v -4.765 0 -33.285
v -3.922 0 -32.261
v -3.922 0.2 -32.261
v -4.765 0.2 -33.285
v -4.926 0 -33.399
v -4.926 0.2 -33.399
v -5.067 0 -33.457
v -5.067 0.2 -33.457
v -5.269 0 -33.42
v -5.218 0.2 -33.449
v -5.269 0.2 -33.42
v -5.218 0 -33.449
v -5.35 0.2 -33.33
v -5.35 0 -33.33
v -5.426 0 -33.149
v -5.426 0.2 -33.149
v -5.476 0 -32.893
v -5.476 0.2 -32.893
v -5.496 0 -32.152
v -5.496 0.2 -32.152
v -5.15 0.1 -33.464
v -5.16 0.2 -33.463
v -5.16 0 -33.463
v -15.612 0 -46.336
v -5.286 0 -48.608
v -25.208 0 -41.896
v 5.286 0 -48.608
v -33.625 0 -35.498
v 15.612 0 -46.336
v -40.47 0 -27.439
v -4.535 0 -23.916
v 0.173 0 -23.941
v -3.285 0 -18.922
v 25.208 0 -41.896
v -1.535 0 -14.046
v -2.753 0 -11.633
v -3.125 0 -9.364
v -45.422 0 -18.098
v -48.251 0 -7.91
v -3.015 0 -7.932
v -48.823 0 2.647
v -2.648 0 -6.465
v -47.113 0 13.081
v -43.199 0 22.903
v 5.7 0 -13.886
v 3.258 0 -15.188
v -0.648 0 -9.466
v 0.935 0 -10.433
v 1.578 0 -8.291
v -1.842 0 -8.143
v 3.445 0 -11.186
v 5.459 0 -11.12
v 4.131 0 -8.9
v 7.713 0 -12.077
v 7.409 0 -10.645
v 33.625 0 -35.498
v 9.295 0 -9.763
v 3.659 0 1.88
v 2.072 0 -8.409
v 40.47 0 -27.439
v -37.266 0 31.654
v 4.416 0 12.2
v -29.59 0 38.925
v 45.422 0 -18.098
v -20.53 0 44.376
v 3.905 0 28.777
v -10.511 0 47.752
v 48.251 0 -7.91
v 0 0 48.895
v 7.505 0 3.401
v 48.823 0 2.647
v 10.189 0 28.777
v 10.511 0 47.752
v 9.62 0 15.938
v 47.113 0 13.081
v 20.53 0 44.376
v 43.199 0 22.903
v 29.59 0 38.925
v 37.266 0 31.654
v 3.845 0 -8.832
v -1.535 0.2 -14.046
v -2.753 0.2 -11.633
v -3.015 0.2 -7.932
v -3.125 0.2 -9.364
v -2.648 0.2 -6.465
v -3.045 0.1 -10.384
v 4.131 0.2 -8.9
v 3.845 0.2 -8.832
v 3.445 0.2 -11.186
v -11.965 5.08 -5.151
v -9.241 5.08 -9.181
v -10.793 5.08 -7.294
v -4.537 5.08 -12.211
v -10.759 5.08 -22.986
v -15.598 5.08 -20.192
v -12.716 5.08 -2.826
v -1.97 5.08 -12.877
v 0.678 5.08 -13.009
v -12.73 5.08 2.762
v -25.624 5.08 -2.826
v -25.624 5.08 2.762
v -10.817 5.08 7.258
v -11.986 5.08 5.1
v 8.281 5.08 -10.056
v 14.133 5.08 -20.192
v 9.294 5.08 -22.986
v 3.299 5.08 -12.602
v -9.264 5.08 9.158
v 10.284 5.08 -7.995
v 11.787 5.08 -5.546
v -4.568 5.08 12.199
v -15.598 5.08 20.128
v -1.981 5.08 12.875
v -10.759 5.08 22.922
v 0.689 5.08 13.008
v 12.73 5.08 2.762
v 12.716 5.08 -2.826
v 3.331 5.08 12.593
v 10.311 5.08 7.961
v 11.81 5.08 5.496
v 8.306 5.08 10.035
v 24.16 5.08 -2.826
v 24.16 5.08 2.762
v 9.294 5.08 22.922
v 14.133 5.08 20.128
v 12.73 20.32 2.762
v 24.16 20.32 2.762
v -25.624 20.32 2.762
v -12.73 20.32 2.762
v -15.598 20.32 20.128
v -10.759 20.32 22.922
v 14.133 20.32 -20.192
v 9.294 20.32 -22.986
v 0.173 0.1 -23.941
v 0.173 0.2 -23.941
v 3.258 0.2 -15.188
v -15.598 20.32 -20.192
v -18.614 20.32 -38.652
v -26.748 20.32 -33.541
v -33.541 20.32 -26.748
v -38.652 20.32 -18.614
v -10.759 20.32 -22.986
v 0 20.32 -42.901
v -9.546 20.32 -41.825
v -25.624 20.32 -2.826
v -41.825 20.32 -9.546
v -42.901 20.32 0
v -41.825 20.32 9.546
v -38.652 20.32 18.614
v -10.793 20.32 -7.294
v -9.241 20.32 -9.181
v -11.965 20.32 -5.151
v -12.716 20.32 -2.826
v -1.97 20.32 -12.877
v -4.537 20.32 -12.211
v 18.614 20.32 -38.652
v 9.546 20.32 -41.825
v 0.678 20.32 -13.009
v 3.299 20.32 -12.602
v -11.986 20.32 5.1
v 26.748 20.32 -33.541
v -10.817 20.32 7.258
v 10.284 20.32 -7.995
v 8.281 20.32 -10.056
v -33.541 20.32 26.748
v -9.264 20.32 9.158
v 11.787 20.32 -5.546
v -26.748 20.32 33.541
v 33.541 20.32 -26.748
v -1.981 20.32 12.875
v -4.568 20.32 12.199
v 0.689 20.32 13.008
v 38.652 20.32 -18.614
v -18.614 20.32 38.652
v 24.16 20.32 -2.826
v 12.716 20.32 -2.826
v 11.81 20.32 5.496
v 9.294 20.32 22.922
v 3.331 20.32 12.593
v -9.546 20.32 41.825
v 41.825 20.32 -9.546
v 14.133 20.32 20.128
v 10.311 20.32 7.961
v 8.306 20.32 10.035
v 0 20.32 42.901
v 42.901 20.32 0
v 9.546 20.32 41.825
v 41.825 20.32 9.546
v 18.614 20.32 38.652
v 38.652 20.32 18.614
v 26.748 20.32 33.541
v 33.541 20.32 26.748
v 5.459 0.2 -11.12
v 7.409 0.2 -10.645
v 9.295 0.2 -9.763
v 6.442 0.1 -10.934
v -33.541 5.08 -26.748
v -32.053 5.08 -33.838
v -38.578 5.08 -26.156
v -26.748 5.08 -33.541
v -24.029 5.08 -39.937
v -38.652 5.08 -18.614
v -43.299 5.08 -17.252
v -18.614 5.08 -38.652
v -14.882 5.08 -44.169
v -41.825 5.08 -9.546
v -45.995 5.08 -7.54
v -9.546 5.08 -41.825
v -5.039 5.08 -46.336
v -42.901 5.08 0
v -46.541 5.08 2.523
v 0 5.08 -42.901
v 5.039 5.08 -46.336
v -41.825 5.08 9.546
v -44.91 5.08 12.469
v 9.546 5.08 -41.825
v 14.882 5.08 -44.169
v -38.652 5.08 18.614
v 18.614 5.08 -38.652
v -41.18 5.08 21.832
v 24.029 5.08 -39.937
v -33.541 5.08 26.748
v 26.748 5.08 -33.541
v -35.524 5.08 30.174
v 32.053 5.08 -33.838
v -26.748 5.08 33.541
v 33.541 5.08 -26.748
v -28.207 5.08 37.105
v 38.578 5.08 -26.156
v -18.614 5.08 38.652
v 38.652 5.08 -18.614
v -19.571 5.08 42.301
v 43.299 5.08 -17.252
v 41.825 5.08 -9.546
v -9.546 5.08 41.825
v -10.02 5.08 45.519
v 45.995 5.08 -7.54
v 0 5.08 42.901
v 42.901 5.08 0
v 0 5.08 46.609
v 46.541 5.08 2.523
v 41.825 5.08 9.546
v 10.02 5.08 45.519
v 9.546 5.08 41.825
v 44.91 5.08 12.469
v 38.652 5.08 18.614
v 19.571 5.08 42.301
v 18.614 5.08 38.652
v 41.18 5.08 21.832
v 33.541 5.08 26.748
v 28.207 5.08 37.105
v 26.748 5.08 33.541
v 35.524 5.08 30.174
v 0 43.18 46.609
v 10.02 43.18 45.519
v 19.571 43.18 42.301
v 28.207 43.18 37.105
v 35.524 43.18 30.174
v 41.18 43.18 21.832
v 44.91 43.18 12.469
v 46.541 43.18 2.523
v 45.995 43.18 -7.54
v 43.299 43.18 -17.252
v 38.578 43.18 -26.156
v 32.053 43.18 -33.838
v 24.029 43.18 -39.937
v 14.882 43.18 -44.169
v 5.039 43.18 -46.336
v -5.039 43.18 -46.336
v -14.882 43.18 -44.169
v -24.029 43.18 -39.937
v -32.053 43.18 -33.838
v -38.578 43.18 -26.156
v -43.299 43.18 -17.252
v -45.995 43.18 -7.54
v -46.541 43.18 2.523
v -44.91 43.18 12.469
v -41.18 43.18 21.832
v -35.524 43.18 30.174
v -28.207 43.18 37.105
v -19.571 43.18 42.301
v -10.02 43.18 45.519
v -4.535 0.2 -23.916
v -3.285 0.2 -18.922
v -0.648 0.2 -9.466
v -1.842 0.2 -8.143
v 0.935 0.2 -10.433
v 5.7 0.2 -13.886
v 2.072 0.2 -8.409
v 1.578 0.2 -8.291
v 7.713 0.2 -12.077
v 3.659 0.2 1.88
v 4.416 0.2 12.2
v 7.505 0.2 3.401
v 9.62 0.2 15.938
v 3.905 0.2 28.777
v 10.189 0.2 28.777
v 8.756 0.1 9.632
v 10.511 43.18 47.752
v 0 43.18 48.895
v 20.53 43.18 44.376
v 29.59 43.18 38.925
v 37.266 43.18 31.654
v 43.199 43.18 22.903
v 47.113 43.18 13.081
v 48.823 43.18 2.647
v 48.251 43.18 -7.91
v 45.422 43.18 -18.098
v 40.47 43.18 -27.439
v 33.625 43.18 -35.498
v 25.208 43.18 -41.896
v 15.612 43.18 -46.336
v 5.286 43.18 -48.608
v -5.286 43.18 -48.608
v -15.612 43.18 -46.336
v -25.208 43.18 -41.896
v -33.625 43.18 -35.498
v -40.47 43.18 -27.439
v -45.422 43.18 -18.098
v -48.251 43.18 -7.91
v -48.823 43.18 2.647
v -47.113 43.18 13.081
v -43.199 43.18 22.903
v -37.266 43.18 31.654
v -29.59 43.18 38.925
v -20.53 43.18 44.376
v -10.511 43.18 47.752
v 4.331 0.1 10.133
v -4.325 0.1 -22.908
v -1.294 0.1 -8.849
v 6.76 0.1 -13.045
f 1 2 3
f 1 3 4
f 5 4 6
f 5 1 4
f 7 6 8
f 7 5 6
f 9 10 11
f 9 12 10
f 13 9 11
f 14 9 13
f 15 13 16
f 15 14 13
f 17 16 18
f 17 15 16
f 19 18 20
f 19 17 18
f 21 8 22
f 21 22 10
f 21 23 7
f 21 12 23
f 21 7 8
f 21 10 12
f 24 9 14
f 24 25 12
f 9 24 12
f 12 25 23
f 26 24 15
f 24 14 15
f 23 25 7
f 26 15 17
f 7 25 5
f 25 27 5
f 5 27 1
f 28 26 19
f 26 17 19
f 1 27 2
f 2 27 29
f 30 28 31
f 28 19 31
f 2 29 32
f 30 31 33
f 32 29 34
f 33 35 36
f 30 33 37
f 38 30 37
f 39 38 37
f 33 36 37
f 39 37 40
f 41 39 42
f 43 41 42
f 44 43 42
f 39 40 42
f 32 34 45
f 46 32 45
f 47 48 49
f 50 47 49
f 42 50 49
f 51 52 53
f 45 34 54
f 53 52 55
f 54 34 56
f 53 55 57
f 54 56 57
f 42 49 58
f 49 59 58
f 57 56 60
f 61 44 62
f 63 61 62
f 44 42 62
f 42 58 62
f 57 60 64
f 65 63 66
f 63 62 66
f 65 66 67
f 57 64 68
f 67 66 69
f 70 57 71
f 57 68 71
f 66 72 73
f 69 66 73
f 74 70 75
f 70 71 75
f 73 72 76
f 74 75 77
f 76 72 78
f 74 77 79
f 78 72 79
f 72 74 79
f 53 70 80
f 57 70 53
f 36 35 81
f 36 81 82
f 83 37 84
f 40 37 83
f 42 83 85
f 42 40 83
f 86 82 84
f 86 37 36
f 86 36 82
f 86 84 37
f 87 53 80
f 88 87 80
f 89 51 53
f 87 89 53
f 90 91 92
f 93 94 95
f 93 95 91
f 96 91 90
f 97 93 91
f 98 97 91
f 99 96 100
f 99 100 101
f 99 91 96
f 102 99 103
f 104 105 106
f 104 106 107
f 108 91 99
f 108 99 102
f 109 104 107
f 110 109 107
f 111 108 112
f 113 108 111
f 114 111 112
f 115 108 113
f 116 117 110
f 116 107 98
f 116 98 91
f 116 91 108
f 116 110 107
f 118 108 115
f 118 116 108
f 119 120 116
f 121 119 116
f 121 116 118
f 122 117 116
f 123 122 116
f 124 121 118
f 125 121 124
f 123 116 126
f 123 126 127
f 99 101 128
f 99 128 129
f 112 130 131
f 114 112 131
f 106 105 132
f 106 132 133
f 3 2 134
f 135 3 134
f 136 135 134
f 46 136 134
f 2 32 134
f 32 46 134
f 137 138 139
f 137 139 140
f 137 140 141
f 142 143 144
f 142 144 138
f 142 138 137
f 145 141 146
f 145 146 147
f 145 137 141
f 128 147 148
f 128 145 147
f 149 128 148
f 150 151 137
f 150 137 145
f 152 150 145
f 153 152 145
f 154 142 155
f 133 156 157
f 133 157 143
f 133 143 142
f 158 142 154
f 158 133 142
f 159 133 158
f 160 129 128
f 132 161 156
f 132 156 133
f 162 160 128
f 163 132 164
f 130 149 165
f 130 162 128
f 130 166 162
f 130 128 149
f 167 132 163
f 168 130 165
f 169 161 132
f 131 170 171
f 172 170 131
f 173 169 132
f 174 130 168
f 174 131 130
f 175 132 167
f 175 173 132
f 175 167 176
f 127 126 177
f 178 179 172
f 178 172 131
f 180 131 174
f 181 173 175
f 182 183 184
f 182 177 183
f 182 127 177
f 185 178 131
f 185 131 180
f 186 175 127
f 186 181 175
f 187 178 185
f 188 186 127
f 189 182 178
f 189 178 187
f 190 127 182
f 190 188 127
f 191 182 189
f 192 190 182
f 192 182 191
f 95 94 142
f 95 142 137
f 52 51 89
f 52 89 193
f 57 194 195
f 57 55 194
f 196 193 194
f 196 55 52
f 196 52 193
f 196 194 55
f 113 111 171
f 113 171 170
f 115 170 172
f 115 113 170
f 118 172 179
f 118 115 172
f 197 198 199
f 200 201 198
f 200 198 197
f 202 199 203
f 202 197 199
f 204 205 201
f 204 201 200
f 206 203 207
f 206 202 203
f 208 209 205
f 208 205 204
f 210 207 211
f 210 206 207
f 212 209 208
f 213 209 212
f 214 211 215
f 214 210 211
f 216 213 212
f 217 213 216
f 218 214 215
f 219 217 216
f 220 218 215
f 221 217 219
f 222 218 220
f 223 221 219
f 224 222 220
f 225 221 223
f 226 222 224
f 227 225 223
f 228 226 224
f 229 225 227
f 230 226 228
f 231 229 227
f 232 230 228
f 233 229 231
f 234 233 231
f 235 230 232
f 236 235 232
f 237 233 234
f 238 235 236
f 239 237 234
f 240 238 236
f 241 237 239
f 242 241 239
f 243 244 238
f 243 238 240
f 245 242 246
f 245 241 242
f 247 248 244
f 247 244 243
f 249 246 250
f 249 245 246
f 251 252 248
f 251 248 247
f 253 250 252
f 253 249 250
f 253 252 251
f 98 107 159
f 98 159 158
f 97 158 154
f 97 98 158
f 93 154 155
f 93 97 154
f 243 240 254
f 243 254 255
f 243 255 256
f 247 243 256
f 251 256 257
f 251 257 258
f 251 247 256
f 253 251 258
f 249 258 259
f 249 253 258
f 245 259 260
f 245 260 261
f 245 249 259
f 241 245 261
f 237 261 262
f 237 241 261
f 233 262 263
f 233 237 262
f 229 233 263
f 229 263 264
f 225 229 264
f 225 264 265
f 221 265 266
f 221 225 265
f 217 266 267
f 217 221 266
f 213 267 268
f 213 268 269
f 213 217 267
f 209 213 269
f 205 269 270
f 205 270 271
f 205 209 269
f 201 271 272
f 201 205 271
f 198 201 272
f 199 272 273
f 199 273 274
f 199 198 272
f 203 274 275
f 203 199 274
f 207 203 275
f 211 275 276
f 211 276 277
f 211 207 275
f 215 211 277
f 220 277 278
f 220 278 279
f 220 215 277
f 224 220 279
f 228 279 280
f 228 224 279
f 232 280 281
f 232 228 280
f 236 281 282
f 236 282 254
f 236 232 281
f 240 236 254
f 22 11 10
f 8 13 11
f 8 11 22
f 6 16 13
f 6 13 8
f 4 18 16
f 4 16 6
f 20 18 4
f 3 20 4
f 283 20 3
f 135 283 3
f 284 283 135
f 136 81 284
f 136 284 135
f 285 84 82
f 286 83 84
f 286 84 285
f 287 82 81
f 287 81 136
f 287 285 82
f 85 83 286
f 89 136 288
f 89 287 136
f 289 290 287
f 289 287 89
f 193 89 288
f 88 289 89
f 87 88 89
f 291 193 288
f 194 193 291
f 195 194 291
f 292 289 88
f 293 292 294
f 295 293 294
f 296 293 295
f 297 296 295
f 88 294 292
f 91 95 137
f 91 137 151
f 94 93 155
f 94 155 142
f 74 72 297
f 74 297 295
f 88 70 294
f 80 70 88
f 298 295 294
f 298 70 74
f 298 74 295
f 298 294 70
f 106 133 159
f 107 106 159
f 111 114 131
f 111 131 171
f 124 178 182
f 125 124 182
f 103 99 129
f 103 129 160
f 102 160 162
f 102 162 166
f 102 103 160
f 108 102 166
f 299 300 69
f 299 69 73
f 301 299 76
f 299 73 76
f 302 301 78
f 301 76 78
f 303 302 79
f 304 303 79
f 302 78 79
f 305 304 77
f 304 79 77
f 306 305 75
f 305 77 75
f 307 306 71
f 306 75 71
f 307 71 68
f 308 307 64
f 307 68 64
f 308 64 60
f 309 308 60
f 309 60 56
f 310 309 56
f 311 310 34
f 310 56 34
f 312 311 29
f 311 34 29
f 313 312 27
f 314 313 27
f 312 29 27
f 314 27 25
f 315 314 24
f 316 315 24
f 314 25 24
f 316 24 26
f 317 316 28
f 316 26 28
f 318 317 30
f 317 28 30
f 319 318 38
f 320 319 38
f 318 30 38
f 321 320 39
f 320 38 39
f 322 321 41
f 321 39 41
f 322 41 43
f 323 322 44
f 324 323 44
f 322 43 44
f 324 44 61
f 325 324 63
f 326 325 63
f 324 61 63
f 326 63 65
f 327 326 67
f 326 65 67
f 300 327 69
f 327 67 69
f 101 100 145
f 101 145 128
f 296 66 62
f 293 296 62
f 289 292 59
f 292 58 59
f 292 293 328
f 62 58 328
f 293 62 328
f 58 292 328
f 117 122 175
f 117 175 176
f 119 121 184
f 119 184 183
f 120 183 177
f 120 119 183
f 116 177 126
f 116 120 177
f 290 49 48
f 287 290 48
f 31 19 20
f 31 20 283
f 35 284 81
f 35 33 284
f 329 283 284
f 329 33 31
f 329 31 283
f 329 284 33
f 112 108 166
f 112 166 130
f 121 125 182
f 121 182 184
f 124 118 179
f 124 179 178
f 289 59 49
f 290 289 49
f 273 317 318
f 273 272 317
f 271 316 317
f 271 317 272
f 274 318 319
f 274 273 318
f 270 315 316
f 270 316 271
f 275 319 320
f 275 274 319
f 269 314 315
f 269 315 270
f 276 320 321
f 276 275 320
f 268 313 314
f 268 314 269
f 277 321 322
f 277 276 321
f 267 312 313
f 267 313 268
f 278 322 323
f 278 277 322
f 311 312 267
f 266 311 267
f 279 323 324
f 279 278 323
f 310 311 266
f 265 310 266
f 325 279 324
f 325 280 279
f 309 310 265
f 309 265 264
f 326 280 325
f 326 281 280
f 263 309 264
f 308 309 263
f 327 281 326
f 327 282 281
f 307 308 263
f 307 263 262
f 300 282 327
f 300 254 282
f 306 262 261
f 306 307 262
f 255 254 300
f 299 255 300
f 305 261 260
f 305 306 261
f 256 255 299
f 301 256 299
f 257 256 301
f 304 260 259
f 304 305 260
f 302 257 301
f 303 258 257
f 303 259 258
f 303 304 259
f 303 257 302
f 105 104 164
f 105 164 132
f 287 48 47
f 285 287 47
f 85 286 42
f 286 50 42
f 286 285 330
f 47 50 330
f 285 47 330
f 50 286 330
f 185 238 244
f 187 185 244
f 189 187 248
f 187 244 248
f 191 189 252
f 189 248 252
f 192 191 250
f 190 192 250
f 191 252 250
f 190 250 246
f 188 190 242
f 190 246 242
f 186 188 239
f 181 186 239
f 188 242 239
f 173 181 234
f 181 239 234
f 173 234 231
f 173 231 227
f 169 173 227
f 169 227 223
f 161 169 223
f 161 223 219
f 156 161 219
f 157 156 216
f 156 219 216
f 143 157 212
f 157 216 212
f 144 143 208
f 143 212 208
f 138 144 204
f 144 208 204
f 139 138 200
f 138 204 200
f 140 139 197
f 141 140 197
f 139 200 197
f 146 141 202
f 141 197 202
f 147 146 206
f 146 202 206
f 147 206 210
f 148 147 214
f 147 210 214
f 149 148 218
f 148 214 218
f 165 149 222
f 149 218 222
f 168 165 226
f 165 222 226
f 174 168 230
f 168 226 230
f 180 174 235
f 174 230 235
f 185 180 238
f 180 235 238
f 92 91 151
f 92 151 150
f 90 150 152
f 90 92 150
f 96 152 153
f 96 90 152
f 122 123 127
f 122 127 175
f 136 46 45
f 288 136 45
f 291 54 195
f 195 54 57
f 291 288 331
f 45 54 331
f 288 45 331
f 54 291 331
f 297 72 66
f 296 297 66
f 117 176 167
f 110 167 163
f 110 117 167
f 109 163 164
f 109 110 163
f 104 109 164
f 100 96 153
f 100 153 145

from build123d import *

# Parameters (mm, degrees)
SKETCH3_R           = 48.895
BOSS_EXTRUDE2_DEPTH = 5.08
SKETCH4_R           = 42.9006
BOSS_EXTRUDE3_DEPTH = 15.24
SKETCH5_R           = 48.895
SKETCH5_R_2         = 46.609
BOSS_EXTRUDE4_DEPTH = 38.1
CUT_EXTRUDE1_DEPTH  = 0.2


with BuildPart() as part:
    # Sketch3 → Boss-Extrude2 (new body)
    with BuildSketch(Plane(origin=(0, 0, 0), x_dir=(1, 0, 0), z_dir=(0, 1, 0))):
        with Locations(Location((0, 0, 0), (0, 0, 270))):  # turned: the seam where the file's is
            Circle(SKETCH3_R)
    extrude(amount=BOSS_EXTRUDE2_DEPTH)

    # Sketch4 → Boss-Extrude3 (add)
    with BuildSketch(Plane(origin=(0, 5.08, 0), x_dir=(1, 0, 0), z_dir=(0, 1, 0))):
        with Locations(Location((0, 0, 0), (0, 0, 270))):  # turned: the seam where the file's is
            Circle(SKETCH4_R)
        with BuildLine():
            ThreePointArc((-4.567935909, -12.199290546), (-0.649198876, -13.01027552), (3.330805622, -12.593429326))
            Line((3.330805622, -12.593429326), (9.293981813, -22.921953464))
            Line((9.293981813, -22.921953464), (14.133331769, -20.127953464))
            Line((14.133331769, -20.127953464), (8.306068354, -10.034837158))
            ThreePointArc((8.306068354, -10.034837158), (11.129081005, -6.769954526), (12.730314912, -2.761849113))
            Line((12.730314912, -2.761849113), (24.159656791, -2.761849113))
            Line((24.159656791, -2.761849113), (24.159656791, 2.826150887))
            Line((24.159656791, 2.826150887), (12.716194378, 2.826150887))
            ThreePointArc((12.716194378, 2.826150887), (11.103422614, 6.811955266), (8.280927567, 10.055593813))
            Line((8.280927567, 10.055593813), (14.133331769, 20.192255238))
            Line((14.133331769, 20.192255238), (9.293981813, 22.986255238))
            Line((9.293981813, 22.986255238), (3.298576906, 12.601909327))
            ThreePointArc((3.298576906, 12.601909327), (-0.649560207, 13.010257485), (-4.537389725, 12.210684779))
            Line((-4.537389725, 12.210684779), (-10.758668231, 22.986255238))
            Line((-10.758668231, 22.986255238), (-15.598018187, 20.192255238))
            Line((-15.598018187, 20.192255238), (-9.240826906, 9.181276947))
            ThreePointArc((-9.240826906, 9.181276947), (-11.429112071, 6.250130044), (-12.716194378, 2.826150887))
            Line((-12.716194378, 2.826150887), (-25.624343209, 2.826150887))
            Line((-25.624343209, 2.826150887), (-25.624343209, -2.761849113))
            Line((-25.624343209, -2.761849113), (-12.730314912, -2.761849113))
            ThreePointArc((-12.730314912, -2.761849113), (-11.452817768, -6.206584686), (-9.26428516, -9.15760606))
            Line((-9.26428516, -9.15760606), (-15.598018187, -20.127953464))
            Line((-15.598018187, -20.127953464), (-10.758668231, -22.921953464))
            Line((-10.758668231, -22.921953464), (-4.567935909, -12.199290546))
        make_face(mode=Mode.SUBTRACT)
    extrude(amount=BOSS_EXTRUDE3_DEPTH)

    # Sketch5 → Boss-Extrude4 (add)
    with BuildSketch(Plane(origin=(0, 5.08, 0), x_dir=(1, 0, 0), z_dir=(0, 1, 0))):
        with Locations(Location((0, 0, 0), (0, 0, 270))):  # turned: the seam where the file's is
            Circle(SKETCH5_R)
        with Locations(Location((0, 0, 0), (0, 0, 270))):  # turned: the seam where the file's is
            Circle(SKETCH5_R_2, mode=Mode.SUBTRACT)
    extrude(amount=BOSS_EXTRUDE4_DEPTH)

    # Sketch7 → Cut-Extrude1 (cut)
    with BuildSketch(Plane.XZ):
        with BuildLine():
            Line((10.189077573, 28.777139206), (3.905470201, 28.777139206))
            add(Edge.make_bspline(
                [(3.905470201, 28.777139206), (5.673403675, 10.082176027), (2.072299934, -8.408708001)],
                knots=[0, 0, 0, 1, 1, 1], degree=2))
            Line((2.072299934, -8.408708001), (1.578207561, -8.290715793))
            Line((1.578207561, -8.290715793), (0.93540787, -10.43338143))
            add(Edge.make_bspline(
                [(0.93540787, -10.43338143), (-1.730658467, -9.24791296), (-2.648379288, -6.465006437)],
                knots=[0, 0, 0, 1, 1, 1], degree=2))
            add(Edge.make_bspline(
                [(-1.535058391, -14.046142711), (-3.997790421, -10.512351861), (-2.648379288, -6.465006437)],
                knots=[0, 0, 0, 1, 1, 1], degree=2))
            add(Edge.make_bspline(
                [(-5.496336768, -32.152202336), (-5.134044818, -22.716243693), (-1.535058391, -14.046142711)],
                knots=[0, 0, 0, 1, 1, 1], degree=2))
            add(Edge.make_bspline(
                [(-3.921713234, -32.261214734), (-5.591404908, -34.721729292), (-5.496336768, -32.152202336)],
                knots=[0, 0, 0, 1, 1, 1], degree=2))
            add(Edge.make_bspline(
                [(-3.921713234, -32.261214734), (0.67700242, -24.157422119), (3.257772607, -15.187585129)],
                knots=[0, 0, 0, 1, 1, 1], degree=2))
            add(Edge.make_bspline(
                [(3.257772607, -15.187585129), (7.244573316, -13.614377412), (9.294943691, -9.762880676)],
                knots=[0, 0, 0, 1, 1, 1], degree=2))
            add(Edge.make_bspline(
                [(3.445088013, -11.186285473), (6.51327774, -11.392596023), (9.294943691, -9.762880676)],
                knots=[0, 0, 0, 1, 1, 1], degree=2))
            Line((3.445088013, -11.186285473), (4.130880832, -8.90030941))
            Line((4.130880832, -8.90030941), (3.845040397, -8.832049008))
            add(Edge.make_bspline(
                [(10.189077573, 28.777139206), (10.494453194, 9.291070289), (3.845040397, -8.832049008)],
                knots=[0, 0, 0, 1, 1, 1], degree=2))
        make_face()
    extrude(amount=-CUT_EXTRUDE1_DEPTH, mode=Mode.SUBTRACT)


solid = part.part
